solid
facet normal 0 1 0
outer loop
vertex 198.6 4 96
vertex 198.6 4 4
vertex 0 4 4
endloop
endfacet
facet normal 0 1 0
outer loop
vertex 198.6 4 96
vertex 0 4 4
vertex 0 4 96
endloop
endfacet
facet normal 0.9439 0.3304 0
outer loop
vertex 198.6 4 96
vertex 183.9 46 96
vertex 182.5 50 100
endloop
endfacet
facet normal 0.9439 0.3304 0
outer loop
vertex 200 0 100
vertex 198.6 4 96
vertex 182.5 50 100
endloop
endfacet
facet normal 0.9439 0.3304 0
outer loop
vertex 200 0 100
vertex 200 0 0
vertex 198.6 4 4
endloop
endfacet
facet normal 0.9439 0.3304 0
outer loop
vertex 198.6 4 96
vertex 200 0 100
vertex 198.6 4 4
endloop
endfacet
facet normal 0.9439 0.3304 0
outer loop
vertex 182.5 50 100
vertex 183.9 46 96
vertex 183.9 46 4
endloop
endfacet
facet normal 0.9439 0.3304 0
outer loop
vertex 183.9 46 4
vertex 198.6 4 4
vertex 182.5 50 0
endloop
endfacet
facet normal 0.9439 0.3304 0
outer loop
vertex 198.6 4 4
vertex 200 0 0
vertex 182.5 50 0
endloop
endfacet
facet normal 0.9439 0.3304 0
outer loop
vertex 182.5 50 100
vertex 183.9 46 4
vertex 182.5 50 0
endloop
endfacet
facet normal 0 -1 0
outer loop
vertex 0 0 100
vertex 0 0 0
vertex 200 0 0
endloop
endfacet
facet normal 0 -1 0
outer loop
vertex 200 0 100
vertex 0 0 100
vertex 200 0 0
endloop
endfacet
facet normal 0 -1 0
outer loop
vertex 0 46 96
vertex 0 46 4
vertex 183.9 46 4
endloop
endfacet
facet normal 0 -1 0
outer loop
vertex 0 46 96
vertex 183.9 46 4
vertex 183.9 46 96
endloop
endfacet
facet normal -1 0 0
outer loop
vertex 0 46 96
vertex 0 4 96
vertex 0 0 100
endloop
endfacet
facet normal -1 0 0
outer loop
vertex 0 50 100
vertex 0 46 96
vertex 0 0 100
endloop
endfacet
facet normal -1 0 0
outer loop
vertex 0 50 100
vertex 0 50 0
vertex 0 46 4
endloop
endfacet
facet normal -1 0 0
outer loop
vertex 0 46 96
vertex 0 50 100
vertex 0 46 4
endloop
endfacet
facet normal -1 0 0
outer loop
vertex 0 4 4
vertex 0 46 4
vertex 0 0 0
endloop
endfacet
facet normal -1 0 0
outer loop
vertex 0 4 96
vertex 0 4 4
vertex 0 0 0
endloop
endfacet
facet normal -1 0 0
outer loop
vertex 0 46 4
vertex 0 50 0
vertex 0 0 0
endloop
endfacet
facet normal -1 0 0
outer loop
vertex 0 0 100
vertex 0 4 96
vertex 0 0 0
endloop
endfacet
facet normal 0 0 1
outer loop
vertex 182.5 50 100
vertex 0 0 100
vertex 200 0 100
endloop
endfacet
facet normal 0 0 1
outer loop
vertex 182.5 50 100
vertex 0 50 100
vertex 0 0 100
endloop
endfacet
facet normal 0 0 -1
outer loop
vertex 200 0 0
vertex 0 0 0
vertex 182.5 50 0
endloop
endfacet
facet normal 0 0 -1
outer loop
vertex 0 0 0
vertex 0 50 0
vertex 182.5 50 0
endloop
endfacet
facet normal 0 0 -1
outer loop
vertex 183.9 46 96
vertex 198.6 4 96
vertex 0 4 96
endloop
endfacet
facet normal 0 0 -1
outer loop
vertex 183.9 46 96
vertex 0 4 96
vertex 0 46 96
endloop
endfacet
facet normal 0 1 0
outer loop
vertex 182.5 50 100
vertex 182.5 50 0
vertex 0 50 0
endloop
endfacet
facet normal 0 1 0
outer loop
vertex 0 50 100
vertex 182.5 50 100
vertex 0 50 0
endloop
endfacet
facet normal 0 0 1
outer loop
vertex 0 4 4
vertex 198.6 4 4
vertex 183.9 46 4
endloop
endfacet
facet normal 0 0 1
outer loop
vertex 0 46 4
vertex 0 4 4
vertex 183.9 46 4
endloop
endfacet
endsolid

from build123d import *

# Parameters (mm, degrees)
DODANIE_WYCI_GNI_CIE1_DEPTH = 100
SZKIC2_W                    = 92
SZKIC2_H                    = 42
WYTNIJ_WYCI_GNI_CIE1_DEPTH  = 200


with BuildPart() as part:
    # Szkic1 → Dodanie-wyciągnięcie1 (new body)
    with BuildSketch(Plane.XY):
        Polygon((0, 0), (200, 0), (182.5, 50), (0, 50), align=None)
    extrude(amount=DODANIE_WYCI_GNI_CIE1_DEPTH)

    # Szkic2 → Wytnij-wyciągnięcie1 (cut)
    with BuildSketch(Plane.ZY):
        with Locations((50, 25)):
            Rectangle(SZKIC2_W, SZKIC2_H)
    extrude(amount=-WYTNIJ_WYCI_GNI_CIE1_DEPTH, mode=Mode.SUBTRACT)


solid = part.part
